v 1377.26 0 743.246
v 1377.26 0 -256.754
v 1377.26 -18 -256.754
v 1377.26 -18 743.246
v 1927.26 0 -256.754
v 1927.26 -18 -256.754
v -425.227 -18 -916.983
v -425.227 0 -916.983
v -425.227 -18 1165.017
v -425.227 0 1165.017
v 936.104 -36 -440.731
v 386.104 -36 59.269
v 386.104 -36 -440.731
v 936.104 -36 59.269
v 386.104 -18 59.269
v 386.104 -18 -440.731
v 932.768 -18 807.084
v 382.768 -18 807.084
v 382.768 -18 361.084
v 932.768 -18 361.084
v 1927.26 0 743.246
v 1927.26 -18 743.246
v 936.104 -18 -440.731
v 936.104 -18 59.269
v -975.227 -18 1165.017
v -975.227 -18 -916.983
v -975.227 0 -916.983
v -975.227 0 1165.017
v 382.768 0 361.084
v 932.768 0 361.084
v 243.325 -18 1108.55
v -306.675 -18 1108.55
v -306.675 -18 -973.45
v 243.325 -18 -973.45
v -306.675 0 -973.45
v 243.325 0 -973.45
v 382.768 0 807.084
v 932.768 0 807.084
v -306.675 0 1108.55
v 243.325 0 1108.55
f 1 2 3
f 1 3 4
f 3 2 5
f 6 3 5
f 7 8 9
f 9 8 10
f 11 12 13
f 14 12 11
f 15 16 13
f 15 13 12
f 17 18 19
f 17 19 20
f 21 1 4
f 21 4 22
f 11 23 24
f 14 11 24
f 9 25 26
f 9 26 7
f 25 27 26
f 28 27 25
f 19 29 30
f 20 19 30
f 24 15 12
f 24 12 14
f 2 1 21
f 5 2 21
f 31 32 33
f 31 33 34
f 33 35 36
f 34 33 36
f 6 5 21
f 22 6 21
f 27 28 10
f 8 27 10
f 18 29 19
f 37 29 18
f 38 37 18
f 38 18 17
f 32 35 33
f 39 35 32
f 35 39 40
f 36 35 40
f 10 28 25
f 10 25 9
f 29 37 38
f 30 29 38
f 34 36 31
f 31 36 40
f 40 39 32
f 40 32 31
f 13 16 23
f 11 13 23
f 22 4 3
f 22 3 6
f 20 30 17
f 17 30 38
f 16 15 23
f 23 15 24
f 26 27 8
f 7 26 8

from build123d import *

# Parameters (mm, degrees)
F0_W     = 550
F0_H     = 2082
F1_DEPTH = 18
F2_W     = 550
F2_H     = 2082
F3_DEPTH = 18
F4_W     = 550
F4_H     = 446
F5_DEPTH = 18
F6_W     = 550
F6_H     = 500
F7_DEPTH = 18
F8_W     = 550
F8_H     = 1000
F9_DEPTH = 18


with BuildPart() as f1:
    # F0 (on Front) → F1 (new body)
    with BuildSketch(Plane.XZ):
        with Locations((-31.67528, 67.549608)):
            Rectangle(F0_W, F0_H)
    extrude(amount=F1_DEPTH)


with BuildPart() as f3:
    # F2 (on Front) → F3 (new body)
    with BuildSketch(Plane.XZ):
        with Locations((-700.226709, 124.017221)):
            Rectangle(F2_W, F2_H)
    extrude(amount=F3_DEPTH)


with BuildPart() as f5:
    # F4 (on Front) → F5 (new body)
    with BuildSketch(Plane.XZ):
        with Locations((657.768399, 584.084063)):
            Rectangle(F4_W, F4_H)
    extrude(amount=F5_DEPTH)


with BuildPart() as f7:
    # F6 (on face) → F7 (new body)
    with BuildSketch(Plane.XZ.offset(18)):
        with Locations((661.103949, -190.731074)):
            Rectangle(F6_W, F6_H)
    extrude(amount=F7_DEPTH)


with BuildPart() as f9:
    # F8 (on Front) → F9 (new body)
    with BuildSketch(Plane.XZ):
        with Locations((1652.260423, 243.245743)):
            Rectangle(F8_W, F8_H)
    extrude(amount=F9_DEPTH)


solid = Compound([f1.part, f3.part, f5.part, f7.part, f9.part])
